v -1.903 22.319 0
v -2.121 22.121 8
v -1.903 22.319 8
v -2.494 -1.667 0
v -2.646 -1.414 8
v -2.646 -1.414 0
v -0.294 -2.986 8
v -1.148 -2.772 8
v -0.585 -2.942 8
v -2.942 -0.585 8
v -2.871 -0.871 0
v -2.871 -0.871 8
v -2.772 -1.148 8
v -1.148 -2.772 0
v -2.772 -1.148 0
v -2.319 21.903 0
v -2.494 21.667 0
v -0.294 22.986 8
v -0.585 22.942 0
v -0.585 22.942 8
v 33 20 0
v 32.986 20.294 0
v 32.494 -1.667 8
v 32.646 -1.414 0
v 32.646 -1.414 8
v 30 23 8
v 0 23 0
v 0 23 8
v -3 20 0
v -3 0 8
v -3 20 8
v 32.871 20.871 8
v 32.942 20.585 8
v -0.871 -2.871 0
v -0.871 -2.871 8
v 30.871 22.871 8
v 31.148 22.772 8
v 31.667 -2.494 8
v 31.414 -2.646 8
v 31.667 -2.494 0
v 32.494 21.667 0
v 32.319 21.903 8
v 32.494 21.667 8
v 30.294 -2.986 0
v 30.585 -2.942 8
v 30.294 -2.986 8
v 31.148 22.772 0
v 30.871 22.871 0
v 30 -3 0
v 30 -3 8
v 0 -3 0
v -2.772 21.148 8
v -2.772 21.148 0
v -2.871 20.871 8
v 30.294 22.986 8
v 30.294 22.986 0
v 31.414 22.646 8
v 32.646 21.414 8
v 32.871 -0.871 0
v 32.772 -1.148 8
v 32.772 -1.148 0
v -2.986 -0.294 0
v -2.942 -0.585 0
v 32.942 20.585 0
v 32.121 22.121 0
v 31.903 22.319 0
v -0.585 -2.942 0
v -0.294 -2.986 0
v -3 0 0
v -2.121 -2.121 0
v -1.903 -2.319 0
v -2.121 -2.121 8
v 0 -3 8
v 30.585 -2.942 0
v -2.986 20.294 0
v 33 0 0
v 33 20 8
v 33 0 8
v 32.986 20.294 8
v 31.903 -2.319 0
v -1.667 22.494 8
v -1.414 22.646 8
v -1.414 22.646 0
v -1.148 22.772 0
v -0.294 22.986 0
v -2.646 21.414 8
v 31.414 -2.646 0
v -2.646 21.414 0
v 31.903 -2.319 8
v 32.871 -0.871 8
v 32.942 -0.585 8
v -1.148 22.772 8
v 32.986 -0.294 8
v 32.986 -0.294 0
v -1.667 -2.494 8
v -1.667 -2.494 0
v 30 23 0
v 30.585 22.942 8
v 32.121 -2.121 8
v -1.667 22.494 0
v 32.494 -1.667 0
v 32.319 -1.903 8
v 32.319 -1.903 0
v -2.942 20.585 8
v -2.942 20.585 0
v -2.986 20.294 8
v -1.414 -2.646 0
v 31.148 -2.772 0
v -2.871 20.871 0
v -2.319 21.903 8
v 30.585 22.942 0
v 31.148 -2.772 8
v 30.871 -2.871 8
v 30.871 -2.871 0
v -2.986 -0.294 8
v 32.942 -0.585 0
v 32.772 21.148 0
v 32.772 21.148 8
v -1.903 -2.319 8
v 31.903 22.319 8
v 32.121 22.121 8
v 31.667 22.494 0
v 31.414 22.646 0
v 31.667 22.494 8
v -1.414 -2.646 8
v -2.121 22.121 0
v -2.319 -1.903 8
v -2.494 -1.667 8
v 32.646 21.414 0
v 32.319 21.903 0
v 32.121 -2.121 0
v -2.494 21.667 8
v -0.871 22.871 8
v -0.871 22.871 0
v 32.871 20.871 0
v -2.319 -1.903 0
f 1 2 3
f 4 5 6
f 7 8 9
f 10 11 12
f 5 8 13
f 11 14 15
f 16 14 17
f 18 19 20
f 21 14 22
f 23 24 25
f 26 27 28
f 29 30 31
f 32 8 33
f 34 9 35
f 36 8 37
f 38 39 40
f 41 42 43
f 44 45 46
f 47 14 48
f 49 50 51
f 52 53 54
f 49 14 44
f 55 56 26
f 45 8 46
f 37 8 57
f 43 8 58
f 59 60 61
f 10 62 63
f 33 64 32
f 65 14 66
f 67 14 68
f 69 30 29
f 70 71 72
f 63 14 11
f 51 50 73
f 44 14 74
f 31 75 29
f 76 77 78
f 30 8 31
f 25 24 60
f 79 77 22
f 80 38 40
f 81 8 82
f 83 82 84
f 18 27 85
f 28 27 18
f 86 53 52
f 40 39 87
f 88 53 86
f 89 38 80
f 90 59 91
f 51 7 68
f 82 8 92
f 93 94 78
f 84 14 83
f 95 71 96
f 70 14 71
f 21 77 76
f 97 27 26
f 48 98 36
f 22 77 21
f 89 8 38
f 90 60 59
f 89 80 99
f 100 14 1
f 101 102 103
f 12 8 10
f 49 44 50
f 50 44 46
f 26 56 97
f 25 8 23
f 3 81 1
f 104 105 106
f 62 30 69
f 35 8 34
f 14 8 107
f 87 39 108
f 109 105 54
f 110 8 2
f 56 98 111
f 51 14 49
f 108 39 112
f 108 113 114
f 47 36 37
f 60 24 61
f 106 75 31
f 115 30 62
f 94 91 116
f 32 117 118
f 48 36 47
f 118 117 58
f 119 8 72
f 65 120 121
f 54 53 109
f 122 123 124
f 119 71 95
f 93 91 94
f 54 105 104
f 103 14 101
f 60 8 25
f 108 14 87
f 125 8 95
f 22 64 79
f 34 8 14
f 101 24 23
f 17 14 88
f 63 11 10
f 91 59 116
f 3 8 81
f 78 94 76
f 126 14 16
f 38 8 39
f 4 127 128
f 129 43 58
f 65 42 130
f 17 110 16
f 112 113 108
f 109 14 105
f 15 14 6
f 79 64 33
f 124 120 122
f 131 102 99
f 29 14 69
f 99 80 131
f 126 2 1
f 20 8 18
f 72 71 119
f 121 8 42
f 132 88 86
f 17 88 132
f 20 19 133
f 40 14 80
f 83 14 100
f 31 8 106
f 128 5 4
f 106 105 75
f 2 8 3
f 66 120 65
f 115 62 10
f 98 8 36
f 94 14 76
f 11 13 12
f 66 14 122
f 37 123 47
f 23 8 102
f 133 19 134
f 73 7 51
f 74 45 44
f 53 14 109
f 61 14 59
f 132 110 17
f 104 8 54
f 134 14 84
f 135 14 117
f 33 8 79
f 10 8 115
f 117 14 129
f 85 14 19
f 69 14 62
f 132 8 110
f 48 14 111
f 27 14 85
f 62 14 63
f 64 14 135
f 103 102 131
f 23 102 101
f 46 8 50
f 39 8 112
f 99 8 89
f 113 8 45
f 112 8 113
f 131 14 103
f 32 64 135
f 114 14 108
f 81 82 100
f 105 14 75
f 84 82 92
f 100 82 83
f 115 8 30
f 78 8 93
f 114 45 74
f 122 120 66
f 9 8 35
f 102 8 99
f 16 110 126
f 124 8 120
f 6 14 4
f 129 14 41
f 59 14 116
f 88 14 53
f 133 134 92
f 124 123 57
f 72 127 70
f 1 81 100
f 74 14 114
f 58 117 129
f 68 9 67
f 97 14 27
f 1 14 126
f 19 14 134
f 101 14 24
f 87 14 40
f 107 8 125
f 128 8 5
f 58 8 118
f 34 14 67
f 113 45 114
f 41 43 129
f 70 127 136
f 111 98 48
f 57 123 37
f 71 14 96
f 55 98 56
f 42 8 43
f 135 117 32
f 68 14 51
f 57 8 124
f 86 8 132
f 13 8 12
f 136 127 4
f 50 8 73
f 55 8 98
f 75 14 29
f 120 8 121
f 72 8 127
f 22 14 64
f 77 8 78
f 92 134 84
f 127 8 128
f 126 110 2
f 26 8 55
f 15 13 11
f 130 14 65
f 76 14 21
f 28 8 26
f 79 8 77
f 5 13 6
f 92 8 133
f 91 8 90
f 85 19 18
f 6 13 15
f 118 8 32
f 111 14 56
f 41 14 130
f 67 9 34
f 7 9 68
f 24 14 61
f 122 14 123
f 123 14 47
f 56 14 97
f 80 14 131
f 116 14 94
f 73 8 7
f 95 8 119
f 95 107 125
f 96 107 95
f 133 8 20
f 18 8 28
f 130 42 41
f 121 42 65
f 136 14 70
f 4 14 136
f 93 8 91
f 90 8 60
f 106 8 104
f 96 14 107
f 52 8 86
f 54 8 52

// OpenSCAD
module posts() { for (x = [0, 30], y = [0, 20]) translate([x, y, 0]) cylinder(h = 8, r = 3, $fn = 64); }
hull() posts();
